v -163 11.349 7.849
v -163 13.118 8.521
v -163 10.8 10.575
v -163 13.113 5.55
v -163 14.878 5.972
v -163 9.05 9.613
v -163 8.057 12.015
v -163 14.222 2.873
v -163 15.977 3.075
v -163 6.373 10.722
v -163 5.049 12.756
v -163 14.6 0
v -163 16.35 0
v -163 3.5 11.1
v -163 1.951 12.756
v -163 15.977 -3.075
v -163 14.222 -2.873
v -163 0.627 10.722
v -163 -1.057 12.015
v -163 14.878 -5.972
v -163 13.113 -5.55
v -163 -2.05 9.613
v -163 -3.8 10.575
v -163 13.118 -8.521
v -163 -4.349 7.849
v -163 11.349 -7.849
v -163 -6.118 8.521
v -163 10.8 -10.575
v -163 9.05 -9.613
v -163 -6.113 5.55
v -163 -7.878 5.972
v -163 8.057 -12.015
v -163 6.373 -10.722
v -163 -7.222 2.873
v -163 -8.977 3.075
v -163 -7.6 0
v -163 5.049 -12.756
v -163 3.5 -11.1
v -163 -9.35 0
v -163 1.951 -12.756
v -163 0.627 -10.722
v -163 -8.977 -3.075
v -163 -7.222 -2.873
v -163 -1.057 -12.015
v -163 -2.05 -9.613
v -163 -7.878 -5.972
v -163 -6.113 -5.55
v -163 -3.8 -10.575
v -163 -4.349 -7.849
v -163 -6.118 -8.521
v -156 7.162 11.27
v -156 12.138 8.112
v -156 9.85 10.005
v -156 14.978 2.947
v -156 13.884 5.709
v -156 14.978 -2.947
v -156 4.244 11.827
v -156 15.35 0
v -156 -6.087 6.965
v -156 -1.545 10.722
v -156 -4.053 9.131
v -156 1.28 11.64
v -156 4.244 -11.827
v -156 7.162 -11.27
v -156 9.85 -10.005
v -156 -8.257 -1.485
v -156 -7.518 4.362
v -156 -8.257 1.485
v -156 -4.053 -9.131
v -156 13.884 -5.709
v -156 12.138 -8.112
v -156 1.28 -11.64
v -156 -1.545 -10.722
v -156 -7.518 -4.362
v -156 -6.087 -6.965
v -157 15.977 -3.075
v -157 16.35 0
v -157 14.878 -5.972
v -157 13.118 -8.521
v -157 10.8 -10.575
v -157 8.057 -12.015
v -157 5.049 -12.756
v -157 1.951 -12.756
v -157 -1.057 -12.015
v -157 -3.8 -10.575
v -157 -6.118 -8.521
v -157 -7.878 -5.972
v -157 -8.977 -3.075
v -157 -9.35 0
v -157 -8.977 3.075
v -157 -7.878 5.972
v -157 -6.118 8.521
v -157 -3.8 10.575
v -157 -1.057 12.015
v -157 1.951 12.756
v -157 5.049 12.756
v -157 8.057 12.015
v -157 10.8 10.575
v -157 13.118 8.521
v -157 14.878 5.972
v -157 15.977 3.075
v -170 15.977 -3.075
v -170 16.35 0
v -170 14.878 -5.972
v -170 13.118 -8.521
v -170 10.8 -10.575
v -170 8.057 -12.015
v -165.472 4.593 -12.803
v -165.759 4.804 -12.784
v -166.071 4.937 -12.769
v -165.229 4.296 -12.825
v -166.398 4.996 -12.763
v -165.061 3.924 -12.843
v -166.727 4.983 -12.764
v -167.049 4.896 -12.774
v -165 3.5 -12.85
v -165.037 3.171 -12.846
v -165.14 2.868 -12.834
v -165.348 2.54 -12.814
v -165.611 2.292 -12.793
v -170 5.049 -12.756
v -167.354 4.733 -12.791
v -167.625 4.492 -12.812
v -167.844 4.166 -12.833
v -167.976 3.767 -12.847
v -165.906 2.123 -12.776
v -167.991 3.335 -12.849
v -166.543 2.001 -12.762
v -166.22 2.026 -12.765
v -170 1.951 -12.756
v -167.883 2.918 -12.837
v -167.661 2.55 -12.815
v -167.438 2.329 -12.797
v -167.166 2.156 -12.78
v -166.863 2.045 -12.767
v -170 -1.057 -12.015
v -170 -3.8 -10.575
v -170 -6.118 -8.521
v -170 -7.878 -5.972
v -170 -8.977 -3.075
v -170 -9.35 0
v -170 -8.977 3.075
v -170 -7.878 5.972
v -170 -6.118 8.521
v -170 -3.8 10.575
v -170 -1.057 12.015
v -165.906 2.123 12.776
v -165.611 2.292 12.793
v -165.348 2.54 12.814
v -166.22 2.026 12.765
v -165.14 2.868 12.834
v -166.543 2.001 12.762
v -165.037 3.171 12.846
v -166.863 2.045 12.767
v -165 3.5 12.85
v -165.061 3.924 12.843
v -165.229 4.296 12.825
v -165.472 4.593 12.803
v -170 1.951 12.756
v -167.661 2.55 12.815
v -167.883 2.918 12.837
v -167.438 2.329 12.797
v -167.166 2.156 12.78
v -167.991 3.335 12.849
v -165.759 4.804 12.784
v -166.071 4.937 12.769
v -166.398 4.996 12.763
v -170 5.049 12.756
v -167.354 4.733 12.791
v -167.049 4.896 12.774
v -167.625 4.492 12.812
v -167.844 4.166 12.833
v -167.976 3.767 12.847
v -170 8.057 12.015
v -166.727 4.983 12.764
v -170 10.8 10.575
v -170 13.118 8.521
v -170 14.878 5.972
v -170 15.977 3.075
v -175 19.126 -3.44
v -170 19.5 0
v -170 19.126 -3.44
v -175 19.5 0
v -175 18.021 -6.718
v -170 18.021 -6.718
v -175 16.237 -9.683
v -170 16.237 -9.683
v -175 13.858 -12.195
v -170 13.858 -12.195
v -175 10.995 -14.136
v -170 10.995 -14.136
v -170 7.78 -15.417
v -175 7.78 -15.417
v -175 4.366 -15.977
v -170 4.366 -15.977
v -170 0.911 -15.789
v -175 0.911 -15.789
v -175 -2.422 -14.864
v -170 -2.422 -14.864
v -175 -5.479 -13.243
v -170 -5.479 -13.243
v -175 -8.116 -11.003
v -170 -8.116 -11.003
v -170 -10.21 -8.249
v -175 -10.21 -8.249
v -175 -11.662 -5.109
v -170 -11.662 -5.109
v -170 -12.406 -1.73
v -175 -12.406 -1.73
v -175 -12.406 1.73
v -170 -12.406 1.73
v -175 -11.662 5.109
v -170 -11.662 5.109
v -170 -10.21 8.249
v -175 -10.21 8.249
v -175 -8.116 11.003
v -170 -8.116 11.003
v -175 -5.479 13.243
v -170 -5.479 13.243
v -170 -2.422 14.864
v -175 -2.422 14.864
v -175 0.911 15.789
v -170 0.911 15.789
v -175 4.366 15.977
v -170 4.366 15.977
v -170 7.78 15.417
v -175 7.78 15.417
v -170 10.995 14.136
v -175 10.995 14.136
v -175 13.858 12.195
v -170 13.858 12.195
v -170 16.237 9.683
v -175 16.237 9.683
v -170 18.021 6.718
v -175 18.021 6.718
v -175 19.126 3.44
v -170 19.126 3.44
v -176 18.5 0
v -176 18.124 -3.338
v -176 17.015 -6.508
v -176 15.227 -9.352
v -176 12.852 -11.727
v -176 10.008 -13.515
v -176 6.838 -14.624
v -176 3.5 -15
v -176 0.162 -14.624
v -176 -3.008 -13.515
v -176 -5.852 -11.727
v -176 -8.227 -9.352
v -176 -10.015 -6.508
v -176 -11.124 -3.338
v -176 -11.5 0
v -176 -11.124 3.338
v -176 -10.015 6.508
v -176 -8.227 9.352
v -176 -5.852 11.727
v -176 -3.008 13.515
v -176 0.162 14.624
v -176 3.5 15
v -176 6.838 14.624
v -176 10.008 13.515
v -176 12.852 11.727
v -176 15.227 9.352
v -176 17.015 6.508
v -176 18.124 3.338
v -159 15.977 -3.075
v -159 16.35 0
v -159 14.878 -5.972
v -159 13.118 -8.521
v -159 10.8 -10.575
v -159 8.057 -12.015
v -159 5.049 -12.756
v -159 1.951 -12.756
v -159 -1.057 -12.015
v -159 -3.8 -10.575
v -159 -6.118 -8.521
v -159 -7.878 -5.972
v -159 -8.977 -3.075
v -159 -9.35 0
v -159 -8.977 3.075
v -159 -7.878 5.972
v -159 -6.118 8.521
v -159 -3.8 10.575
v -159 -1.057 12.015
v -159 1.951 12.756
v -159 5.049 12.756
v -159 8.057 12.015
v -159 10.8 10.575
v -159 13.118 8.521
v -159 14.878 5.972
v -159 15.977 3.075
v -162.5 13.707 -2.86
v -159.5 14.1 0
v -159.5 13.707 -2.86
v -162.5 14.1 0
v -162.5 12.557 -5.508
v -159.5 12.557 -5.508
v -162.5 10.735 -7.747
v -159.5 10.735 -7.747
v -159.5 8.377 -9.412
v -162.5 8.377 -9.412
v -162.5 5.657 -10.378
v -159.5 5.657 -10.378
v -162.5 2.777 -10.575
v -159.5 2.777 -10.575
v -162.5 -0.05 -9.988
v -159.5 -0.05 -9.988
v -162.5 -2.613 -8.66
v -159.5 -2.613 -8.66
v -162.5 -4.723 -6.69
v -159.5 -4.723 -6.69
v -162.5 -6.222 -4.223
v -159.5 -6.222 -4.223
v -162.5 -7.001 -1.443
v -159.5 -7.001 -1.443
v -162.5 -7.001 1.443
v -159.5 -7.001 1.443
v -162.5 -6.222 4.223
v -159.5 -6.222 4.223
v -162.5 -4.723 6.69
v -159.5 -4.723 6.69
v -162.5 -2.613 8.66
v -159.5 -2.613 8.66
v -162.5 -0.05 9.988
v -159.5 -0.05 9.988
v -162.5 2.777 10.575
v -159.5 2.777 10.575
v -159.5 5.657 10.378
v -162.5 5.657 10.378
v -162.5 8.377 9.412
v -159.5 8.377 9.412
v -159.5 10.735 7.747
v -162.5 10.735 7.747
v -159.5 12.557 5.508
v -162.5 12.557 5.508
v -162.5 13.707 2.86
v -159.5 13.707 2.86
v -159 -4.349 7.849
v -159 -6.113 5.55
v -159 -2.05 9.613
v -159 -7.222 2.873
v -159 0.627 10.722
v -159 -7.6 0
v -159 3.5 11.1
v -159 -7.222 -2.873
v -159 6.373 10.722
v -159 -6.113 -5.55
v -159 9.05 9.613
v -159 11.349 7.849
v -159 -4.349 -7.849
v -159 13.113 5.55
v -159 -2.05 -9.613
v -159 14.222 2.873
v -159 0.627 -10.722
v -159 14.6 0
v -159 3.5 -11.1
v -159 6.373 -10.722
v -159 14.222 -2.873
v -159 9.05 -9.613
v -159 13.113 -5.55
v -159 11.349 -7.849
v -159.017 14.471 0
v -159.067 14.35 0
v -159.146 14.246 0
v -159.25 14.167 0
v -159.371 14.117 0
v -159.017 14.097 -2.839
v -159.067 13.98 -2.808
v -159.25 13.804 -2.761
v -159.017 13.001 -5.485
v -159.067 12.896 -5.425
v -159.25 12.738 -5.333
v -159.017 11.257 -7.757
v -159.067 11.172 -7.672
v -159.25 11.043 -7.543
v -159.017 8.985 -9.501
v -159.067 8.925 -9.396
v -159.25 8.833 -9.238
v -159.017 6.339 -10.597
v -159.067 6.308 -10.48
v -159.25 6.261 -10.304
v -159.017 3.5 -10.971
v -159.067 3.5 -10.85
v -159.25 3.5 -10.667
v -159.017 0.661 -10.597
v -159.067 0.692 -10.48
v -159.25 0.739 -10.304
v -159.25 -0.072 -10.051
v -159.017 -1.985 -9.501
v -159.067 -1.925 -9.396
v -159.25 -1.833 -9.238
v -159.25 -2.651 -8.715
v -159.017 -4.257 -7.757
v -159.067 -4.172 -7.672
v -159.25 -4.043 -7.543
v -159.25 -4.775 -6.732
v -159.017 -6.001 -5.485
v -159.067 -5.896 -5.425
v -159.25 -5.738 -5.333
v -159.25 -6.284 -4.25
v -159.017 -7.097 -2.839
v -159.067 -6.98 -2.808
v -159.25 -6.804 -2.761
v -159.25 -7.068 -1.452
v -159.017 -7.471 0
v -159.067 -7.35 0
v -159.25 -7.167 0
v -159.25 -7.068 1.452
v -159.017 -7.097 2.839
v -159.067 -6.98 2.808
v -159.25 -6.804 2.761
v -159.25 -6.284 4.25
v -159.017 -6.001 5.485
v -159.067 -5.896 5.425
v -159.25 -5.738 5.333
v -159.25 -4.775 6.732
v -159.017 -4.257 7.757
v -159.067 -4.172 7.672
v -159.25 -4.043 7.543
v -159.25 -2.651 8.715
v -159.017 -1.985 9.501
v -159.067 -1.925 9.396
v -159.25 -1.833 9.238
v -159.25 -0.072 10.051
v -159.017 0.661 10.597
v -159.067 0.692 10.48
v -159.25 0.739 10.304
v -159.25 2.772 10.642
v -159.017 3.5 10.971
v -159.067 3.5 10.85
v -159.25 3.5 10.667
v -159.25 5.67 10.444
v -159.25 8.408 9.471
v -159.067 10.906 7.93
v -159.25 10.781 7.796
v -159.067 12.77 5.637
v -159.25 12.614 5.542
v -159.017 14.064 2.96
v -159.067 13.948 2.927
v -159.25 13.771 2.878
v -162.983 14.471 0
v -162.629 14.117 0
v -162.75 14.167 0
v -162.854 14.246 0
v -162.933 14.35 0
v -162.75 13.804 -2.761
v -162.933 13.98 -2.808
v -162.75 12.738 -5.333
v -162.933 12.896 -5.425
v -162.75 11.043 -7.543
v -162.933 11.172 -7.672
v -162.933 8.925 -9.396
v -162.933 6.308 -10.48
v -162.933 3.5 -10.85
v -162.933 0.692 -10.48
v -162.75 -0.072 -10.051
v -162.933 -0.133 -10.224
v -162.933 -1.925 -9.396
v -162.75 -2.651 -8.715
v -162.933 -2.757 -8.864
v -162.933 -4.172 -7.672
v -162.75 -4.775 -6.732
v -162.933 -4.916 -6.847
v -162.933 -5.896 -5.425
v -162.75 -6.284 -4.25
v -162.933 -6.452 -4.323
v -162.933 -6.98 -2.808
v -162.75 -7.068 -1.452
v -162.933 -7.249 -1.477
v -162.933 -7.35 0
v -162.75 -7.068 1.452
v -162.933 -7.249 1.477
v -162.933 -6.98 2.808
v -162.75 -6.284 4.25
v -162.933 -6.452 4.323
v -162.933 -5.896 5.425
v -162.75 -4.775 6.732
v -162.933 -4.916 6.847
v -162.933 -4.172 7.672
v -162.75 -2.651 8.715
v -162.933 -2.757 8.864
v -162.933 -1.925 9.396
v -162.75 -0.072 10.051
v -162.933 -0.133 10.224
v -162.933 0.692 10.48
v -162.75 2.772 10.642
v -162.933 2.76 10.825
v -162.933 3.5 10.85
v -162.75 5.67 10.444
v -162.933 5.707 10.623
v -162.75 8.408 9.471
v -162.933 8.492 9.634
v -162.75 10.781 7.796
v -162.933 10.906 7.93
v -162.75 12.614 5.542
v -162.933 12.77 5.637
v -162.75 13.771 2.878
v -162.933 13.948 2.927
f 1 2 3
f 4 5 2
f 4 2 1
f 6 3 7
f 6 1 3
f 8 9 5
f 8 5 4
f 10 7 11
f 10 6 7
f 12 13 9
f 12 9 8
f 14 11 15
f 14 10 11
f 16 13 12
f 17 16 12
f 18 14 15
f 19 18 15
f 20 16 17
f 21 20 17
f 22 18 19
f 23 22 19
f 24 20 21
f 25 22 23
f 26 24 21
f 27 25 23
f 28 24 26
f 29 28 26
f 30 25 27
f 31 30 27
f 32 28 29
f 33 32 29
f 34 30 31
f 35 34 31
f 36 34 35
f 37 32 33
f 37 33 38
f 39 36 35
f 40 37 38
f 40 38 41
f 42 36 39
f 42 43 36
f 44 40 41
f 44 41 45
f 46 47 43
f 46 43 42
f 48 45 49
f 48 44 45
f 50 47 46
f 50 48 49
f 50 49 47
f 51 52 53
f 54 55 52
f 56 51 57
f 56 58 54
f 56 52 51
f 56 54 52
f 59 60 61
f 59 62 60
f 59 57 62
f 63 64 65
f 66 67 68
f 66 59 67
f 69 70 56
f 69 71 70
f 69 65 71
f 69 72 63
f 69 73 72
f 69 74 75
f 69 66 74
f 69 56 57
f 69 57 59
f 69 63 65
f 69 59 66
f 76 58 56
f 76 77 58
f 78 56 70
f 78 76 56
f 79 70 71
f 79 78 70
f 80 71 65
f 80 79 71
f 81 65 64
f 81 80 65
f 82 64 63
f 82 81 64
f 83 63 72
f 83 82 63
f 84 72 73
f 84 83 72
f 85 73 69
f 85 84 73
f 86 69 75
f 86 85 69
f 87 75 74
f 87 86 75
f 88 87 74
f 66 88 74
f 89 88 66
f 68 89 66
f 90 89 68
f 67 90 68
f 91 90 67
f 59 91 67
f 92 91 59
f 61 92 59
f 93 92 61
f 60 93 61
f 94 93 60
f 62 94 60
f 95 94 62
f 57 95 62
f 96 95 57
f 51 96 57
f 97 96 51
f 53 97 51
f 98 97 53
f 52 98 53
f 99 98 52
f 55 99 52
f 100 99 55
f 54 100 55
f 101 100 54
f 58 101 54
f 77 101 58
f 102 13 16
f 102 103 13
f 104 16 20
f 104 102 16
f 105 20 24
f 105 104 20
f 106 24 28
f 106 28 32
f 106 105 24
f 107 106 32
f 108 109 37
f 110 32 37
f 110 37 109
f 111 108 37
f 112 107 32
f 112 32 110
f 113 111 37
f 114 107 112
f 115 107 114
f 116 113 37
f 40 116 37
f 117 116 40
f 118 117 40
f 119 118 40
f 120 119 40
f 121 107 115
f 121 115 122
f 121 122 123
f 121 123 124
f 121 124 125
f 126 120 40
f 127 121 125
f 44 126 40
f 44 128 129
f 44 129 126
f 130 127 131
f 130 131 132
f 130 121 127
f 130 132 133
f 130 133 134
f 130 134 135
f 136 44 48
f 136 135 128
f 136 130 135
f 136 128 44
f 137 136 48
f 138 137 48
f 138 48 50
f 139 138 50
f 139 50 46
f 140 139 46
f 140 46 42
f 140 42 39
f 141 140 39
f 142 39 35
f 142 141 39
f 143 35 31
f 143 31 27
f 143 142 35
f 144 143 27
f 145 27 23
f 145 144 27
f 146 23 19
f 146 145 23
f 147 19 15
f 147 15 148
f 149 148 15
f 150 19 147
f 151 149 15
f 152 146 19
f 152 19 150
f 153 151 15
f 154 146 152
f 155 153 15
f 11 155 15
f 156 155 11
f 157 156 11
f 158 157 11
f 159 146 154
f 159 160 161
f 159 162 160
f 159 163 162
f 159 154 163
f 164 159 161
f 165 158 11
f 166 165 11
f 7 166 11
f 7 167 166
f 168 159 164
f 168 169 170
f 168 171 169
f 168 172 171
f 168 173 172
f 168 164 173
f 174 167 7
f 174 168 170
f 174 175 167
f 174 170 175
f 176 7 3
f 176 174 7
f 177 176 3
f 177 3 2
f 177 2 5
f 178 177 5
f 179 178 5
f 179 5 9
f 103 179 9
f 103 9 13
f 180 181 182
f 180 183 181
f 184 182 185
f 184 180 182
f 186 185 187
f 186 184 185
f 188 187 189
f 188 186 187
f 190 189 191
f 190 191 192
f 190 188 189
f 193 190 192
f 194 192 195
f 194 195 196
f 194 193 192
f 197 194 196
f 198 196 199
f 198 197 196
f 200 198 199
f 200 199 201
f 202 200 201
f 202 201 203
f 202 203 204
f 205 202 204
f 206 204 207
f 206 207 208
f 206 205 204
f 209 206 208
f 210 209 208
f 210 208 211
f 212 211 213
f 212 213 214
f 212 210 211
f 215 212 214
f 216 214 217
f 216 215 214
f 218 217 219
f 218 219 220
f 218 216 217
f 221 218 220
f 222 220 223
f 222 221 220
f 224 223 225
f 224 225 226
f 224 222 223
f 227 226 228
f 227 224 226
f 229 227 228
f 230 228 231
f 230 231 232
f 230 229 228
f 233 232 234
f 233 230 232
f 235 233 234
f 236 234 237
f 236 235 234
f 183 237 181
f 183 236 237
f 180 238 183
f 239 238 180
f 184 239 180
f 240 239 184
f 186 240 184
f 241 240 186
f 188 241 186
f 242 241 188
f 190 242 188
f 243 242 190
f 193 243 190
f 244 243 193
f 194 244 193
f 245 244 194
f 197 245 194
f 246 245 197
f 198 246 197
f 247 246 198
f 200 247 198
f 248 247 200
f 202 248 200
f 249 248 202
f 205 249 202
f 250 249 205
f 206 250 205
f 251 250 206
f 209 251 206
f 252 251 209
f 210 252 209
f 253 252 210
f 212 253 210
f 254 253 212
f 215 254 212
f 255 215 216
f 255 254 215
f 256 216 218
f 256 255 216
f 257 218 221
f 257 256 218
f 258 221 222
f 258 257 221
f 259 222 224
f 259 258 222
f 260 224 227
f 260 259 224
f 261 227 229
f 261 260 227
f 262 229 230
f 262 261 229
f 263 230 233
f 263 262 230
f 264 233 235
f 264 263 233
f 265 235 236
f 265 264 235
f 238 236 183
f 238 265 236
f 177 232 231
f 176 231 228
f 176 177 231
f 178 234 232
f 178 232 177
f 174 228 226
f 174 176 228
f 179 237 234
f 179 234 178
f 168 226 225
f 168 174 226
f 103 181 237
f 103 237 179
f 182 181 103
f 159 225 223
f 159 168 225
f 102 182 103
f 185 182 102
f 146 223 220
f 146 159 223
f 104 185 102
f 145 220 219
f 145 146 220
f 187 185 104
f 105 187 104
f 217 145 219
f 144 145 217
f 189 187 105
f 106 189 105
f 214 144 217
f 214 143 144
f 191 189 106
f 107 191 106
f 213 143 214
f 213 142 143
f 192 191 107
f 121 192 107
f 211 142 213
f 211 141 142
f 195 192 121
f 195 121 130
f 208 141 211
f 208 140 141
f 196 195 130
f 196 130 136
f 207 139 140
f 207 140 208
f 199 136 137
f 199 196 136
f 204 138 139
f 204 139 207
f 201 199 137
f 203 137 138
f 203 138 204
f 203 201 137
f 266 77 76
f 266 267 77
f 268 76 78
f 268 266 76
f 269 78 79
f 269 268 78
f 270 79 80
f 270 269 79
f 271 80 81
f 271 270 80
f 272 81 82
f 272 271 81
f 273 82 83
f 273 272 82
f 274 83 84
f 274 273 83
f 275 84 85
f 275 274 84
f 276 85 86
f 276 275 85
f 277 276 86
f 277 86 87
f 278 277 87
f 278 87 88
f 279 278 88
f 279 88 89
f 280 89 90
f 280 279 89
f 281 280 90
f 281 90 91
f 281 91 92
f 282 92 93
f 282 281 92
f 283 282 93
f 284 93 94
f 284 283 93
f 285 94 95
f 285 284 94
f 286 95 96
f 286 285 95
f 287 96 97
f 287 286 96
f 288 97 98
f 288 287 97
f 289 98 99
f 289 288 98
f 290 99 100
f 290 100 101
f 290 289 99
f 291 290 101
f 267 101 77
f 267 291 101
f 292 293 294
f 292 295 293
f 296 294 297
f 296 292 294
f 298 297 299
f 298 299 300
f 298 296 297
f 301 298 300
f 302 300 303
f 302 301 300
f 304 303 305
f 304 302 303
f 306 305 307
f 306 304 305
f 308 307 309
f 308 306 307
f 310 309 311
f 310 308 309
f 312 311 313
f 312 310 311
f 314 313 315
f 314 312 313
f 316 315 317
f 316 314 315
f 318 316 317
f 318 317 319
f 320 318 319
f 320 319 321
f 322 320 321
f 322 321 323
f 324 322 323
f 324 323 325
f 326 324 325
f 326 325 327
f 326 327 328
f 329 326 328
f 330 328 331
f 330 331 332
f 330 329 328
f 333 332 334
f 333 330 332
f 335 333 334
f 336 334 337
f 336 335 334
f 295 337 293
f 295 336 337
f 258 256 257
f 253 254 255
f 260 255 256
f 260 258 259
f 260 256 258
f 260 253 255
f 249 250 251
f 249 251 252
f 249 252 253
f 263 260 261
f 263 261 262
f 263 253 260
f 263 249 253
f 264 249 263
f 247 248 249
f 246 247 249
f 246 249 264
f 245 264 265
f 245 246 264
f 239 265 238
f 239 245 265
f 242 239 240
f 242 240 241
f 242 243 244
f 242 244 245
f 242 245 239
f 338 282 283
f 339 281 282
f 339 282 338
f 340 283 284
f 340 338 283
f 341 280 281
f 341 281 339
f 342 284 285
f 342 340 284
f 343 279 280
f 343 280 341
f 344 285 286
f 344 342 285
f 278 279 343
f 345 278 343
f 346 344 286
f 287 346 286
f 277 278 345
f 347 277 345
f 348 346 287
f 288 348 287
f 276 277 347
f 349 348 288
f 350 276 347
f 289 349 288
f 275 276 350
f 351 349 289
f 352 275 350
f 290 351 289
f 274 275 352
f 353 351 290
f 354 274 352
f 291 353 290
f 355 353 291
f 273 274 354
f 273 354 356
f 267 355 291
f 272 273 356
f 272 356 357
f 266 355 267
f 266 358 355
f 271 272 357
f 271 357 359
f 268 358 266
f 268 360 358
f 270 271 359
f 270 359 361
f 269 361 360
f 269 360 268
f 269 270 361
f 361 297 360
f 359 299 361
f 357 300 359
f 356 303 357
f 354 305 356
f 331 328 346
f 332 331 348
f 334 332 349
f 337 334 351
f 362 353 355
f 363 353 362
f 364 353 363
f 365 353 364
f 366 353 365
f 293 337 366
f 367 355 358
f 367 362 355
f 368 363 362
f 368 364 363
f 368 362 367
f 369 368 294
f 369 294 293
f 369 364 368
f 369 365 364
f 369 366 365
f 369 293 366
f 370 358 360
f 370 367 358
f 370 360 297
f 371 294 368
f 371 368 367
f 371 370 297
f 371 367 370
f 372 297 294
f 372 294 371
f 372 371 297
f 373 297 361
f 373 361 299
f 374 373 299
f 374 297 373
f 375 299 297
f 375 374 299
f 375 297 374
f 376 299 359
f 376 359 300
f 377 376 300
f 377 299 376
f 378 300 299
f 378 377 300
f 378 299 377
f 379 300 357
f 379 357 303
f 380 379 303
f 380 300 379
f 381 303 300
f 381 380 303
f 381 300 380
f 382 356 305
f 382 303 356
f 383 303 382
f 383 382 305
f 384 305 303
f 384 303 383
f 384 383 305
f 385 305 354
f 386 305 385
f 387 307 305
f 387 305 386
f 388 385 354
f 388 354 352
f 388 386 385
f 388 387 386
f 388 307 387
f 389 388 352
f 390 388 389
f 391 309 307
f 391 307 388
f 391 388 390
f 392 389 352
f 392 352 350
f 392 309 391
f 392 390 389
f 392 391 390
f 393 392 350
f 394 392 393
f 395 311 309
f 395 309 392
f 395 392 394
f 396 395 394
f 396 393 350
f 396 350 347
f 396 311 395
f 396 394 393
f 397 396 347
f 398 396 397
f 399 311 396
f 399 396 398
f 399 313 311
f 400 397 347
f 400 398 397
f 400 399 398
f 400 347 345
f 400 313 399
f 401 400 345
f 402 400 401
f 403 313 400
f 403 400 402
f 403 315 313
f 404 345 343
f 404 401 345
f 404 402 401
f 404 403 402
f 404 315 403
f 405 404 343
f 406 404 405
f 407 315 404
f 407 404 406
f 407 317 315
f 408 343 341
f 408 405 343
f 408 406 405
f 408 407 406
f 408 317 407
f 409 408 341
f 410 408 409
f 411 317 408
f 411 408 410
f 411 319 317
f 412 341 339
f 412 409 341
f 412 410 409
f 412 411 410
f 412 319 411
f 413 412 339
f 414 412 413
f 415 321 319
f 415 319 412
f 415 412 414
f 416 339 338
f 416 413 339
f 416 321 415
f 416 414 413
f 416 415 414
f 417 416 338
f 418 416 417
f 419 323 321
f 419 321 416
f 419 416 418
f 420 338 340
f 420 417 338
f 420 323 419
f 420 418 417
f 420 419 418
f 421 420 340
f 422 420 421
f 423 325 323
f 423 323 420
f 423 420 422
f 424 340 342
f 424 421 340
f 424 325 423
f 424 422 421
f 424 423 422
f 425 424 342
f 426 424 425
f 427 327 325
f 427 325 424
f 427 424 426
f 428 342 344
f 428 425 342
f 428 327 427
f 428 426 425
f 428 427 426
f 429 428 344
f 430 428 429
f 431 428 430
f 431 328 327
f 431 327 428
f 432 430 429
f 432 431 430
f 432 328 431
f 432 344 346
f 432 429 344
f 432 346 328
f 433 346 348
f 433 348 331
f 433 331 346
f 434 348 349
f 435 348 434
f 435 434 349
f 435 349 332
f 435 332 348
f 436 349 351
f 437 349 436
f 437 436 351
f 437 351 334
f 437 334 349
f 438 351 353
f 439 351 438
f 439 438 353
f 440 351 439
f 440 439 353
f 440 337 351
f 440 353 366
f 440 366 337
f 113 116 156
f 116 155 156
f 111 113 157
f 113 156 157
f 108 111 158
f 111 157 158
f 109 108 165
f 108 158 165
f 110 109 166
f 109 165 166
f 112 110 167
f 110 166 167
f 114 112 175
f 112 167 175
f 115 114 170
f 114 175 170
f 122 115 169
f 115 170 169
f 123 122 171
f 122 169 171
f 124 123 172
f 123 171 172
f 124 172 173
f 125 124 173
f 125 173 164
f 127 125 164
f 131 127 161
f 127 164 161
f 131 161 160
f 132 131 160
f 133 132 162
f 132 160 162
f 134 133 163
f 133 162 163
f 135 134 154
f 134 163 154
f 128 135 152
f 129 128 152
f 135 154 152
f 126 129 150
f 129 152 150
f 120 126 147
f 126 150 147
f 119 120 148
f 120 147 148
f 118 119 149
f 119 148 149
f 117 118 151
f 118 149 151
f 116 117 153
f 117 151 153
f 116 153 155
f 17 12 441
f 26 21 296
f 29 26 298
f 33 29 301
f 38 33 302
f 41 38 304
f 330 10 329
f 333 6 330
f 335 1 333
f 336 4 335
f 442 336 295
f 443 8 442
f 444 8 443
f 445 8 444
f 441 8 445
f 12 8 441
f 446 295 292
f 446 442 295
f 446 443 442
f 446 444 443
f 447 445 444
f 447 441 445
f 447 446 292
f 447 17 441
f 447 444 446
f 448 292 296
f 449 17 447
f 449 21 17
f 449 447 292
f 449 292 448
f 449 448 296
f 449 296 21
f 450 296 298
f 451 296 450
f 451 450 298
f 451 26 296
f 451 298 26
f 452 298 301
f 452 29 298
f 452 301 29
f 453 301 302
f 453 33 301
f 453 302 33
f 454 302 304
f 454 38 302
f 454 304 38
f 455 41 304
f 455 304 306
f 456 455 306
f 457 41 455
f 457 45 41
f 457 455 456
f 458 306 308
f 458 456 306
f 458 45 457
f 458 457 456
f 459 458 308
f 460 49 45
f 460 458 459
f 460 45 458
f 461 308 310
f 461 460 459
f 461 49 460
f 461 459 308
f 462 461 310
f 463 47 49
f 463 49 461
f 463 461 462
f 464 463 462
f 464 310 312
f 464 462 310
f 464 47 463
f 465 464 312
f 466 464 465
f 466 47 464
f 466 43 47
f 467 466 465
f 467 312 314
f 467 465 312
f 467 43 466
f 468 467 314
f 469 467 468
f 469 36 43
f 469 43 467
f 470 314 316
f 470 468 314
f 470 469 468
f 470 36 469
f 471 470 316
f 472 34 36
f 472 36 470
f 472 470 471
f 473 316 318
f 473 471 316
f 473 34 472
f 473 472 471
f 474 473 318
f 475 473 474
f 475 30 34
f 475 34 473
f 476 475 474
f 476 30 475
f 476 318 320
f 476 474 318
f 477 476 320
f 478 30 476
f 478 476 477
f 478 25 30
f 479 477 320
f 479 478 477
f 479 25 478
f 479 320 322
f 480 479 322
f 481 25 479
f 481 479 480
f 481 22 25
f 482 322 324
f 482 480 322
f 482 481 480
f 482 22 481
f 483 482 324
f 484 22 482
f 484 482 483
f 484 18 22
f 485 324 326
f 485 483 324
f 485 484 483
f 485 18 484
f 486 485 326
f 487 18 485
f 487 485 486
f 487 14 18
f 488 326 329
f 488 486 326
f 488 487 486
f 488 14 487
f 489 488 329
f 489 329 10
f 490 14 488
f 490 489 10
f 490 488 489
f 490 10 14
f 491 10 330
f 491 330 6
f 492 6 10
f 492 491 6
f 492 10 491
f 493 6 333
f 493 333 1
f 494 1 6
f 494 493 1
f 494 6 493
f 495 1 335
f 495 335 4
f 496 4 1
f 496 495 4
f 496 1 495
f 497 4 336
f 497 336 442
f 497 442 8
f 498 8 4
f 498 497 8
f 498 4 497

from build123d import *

# Parameters (mm, degrees)
ESQUISSE2_R                  = 1.5
ENL_V_MAT_EXTRU_1_DEPTH      = 17
ENL_V_MAT_EXTRU_1_DEPTH_BACK = 17


with BuildPart() as part:
    # Esquisse1 → Révolution1 (revolve)
    with BuildSketch(Plane.XY):
        with BuildLine():
            Line((-170, 19.5), (-175, 19.5))
            Line((-175, 19.5), (-176, 18.5))
            Line((-176, 18.5), (-176, 3.5))
            Line((-176, 3.5), (-156, 3.5))
            Line((-156, 3.5), (-156, 15.35))
            Line((-156, 15.35), (-157, 16.35))
            Line((-157, 16.35), (-159, 16.35))
            Line((-159, 16.35), (-159, 14.6))
            ThreePointArc((-159, 14.6), (-159.146446609, 14.246446609), (-159.5, 14.1))
            Line((-159.5, 14.1), (-162.5, 14.1))
            ThreePointArc((-162.5, 14.1), (-162.853553391, 14.246446609), (-163, 14.6))
            Line((-163, 14.6), (-163, 16.35))
            Line((-163, 16.35), (-170, 16.35))
            Line((-170, 16.35), (-170, 19.5))
        make_face()
    revolve(axis=Axis((-170, 3.5, 0), (-1, 0, 0)))

    # Esquisse2 → Enlèv. mat.-Extru.1 (cut, two sides)
    with BuildSketch(Plane.XY) as enl_v_mat_extru_1_sk:
        with Locations((-166.5, 3.5)):
            Circle(ESQUISSE2_R)
    extrude(amount=ENL_V_MAT_EXTRU_1_DEPTH, mode=Mode.SUBTRACT)
    extrude(enl_v_mat_extru_1_sk.sketch, amount=-ENL_V_MAT_EXTRU_1_DEPTH_BACK, mode=Mode.SUBTRACT)


solid = part.part
